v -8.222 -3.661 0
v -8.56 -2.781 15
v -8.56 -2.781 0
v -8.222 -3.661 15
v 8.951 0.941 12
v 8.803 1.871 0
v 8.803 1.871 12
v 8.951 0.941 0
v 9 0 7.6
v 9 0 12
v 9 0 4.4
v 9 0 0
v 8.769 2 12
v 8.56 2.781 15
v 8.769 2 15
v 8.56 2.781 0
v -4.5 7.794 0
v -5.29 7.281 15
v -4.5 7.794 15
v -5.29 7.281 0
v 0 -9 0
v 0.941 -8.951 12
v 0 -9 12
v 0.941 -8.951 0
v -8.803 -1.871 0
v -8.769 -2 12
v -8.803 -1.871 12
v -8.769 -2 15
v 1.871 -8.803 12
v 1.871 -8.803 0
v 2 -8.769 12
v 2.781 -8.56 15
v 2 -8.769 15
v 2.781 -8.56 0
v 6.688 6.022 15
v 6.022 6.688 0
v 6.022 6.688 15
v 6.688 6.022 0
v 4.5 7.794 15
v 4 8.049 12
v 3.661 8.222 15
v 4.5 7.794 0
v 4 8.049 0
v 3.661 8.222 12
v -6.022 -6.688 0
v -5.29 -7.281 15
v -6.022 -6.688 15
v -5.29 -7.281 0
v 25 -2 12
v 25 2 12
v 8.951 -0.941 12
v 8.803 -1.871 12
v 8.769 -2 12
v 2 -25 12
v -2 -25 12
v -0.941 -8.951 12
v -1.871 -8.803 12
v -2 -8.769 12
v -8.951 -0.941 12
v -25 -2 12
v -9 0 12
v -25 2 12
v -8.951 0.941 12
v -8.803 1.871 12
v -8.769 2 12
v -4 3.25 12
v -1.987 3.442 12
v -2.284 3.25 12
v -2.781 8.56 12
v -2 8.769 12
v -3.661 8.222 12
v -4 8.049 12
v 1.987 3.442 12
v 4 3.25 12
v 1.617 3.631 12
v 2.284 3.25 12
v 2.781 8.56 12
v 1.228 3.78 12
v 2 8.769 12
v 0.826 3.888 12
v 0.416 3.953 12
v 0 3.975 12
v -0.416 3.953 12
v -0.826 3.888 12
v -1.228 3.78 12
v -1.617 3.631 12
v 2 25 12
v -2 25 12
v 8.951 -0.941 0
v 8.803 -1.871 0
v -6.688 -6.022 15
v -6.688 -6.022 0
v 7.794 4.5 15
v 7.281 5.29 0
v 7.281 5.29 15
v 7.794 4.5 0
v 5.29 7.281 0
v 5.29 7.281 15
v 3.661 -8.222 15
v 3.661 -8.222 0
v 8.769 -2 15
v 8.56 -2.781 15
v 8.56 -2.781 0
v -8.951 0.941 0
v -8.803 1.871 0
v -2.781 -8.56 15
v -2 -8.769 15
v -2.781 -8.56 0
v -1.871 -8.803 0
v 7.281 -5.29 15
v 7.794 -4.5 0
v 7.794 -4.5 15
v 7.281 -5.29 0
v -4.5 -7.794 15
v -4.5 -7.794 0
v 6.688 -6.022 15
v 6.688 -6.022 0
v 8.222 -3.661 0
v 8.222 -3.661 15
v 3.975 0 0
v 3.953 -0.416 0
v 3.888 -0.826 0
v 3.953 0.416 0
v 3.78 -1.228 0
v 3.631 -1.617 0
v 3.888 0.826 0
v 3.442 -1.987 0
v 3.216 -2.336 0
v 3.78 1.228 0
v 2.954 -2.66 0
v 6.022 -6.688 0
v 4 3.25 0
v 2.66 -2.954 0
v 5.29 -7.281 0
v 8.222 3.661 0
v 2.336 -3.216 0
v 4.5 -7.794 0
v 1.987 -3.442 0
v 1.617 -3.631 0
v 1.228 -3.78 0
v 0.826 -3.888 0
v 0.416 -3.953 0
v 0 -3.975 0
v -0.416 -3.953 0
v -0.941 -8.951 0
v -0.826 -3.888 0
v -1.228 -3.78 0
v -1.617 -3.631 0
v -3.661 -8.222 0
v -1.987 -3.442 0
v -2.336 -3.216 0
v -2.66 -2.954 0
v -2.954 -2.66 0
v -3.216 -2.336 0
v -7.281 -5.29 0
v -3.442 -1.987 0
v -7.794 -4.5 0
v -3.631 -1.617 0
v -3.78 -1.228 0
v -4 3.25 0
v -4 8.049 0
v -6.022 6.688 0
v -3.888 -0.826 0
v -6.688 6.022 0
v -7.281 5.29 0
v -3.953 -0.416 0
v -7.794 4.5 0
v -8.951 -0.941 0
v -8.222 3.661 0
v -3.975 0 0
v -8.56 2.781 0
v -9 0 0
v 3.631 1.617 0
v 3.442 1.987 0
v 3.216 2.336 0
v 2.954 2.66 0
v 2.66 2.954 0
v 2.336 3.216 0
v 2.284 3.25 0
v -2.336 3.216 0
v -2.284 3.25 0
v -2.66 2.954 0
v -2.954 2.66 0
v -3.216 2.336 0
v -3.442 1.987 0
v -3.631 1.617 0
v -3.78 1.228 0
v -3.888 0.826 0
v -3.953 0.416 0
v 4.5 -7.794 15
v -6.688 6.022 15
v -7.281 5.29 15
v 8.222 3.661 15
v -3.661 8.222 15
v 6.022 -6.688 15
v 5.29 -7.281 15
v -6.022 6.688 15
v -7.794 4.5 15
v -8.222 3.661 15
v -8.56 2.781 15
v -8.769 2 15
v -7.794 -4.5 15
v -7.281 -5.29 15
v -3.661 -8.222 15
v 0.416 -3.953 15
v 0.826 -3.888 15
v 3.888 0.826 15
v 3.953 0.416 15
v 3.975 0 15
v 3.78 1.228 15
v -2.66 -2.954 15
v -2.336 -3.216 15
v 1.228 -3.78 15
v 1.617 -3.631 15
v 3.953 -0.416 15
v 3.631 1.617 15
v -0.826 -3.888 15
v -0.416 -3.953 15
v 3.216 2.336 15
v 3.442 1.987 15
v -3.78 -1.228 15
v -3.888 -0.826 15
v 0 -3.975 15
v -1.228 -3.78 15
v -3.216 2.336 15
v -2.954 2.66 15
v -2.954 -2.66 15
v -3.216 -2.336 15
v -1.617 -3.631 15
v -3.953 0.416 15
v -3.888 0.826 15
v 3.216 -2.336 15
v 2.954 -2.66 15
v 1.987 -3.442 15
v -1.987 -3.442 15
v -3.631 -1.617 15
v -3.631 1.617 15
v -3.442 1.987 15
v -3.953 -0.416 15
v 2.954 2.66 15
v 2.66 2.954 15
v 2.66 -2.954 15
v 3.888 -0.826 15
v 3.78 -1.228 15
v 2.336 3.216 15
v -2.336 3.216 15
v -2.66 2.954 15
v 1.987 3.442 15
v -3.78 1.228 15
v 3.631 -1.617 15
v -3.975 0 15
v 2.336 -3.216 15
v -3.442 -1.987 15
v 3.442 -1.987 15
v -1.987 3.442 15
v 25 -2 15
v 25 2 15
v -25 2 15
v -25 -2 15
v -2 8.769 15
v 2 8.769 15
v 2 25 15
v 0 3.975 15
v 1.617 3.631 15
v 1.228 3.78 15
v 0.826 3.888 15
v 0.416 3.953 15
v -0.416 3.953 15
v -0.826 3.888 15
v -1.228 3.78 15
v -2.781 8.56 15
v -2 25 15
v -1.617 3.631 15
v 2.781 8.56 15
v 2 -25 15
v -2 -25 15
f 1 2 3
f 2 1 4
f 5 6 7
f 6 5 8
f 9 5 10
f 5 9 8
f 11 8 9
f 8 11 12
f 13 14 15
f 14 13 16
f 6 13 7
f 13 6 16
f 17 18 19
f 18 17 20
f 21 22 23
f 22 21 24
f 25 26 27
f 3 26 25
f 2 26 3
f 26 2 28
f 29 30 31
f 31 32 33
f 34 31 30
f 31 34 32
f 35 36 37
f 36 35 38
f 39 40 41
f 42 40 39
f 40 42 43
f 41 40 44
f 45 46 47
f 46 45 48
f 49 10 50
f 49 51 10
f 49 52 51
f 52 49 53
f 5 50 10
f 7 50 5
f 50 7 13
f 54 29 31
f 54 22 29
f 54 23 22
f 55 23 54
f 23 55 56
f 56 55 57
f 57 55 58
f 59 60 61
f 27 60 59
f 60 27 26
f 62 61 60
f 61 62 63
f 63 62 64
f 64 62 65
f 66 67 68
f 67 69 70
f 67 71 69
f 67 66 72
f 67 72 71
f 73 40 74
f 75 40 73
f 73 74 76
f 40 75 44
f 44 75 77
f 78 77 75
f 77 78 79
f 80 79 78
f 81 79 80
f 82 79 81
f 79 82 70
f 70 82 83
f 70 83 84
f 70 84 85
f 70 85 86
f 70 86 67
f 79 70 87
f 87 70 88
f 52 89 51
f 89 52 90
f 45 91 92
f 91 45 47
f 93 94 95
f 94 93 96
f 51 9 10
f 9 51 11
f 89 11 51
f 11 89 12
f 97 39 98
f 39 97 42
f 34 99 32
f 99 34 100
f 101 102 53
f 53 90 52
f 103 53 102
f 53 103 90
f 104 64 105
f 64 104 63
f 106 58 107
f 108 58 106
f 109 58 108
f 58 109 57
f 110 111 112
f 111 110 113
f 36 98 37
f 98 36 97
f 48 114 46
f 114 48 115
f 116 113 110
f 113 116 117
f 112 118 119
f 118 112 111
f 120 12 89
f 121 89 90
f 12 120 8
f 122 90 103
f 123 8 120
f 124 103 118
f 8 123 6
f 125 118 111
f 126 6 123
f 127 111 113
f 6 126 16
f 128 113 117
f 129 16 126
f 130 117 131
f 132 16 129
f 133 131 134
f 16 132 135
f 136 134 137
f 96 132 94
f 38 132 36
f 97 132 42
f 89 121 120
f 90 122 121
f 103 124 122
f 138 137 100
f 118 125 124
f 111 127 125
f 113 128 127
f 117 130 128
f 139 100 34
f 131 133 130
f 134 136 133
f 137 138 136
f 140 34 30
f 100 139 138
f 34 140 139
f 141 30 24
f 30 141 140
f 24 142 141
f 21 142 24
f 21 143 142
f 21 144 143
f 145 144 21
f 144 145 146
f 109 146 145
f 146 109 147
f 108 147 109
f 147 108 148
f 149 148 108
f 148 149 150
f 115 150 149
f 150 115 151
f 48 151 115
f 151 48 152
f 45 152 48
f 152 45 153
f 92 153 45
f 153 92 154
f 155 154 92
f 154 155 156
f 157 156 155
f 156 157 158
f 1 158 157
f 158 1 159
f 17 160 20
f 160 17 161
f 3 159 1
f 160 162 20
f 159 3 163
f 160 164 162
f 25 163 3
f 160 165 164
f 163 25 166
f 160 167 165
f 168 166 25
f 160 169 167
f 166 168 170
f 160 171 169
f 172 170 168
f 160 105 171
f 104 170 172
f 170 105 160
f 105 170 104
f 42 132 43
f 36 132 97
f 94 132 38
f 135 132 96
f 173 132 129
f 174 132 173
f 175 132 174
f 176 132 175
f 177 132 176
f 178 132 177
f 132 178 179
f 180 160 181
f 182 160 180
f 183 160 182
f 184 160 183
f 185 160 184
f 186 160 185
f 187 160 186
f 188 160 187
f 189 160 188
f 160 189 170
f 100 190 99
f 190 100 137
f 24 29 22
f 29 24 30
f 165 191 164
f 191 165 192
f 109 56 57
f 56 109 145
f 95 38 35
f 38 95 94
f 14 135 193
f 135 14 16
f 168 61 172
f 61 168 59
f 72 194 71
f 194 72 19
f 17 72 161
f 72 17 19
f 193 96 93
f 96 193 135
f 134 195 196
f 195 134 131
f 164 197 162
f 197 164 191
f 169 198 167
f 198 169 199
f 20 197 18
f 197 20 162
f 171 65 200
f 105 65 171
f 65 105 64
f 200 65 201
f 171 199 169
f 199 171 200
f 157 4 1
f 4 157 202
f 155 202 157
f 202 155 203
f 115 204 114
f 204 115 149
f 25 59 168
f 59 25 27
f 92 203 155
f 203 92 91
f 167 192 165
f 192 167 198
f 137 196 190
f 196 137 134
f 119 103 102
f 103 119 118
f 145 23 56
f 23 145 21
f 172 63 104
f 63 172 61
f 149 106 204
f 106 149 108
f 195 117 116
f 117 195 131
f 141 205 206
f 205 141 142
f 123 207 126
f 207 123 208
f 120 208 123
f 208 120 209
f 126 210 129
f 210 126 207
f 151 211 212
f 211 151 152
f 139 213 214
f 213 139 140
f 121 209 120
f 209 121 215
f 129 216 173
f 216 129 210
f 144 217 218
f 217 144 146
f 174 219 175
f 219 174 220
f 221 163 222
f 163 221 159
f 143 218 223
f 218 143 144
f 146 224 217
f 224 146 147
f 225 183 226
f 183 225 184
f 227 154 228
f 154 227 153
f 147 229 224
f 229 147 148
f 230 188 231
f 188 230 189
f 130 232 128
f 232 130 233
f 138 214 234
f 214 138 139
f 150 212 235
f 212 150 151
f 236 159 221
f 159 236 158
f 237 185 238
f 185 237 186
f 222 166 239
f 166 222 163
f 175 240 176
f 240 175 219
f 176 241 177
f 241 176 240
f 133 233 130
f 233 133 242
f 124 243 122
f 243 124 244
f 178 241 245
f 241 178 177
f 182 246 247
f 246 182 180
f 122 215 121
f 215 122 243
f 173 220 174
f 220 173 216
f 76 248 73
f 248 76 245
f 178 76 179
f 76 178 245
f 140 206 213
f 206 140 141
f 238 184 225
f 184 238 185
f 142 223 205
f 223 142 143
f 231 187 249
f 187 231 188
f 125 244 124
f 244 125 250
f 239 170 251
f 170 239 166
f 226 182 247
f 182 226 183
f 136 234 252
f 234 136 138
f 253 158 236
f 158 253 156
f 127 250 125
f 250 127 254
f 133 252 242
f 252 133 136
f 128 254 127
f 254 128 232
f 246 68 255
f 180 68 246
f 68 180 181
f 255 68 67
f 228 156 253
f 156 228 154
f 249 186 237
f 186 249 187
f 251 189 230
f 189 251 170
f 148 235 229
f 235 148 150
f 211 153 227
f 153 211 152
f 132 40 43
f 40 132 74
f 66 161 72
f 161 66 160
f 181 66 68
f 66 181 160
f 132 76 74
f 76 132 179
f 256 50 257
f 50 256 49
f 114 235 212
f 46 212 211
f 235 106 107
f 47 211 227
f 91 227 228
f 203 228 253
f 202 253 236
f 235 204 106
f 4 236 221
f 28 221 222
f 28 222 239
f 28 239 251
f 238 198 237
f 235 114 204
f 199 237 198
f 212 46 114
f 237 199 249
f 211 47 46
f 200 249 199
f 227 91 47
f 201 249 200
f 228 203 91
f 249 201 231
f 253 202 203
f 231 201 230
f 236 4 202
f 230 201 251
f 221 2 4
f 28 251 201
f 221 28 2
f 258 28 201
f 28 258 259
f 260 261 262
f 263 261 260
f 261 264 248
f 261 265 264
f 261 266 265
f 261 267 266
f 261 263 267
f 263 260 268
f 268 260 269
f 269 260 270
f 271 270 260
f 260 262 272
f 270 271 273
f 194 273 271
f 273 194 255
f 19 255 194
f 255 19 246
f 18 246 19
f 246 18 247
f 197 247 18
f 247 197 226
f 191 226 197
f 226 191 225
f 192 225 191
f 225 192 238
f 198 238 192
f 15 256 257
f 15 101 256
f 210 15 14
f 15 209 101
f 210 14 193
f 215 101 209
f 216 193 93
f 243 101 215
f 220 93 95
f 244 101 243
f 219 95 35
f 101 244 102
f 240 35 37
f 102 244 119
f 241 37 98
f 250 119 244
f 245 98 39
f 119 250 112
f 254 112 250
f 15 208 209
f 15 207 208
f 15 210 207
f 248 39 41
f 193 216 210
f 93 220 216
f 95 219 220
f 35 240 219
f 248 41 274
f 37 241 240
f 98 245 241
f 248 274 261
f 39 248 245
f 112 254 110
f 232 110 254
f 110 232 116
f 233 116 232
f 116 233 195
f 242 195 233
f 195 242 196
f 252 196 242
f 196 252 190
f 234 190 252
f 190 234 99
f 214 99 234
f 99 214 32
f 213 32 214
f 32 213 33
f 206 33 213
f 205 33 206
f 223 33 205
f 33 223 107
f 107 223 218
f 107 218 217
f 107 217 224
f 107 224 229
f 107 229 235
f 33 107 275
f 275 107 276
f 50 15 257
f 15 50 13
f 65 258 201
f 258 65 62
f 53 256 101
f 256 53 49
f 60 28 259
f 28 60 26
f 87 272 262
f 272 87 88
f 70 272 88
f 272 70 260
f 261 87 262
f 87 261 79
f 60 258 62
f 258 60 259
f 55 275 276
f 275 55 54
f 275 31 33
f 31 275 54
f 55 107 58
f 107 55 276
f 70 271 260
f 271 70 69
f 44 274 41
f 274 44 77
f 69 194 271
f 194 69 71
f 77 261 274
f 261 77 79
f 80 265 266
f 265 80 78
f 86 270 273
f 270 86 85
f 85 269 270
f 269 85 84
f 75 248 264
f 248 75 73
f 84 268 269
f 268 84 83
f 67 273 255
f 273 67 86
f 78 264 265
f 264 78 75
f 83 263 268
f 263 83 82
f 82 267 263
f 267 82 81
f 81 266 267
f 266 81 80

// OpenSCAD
// ============================================================
// Wheel Hub Adapter — 8 mm bore to 120 mm rubber wheel
// ============================================================
// Press-fits onto motor shaft (8 mm D-flat or round).
// Outer spokes bolt to the wheel centre disc.
//
// Adjust shaft_d and flat_w if using a D-shaft motor.
// ============================================================

shaft_d    =  8.0;  // mm — motor shaft diameter
shaft_tol  =  0.05; // mm — diametric interference (press-fit)
flat_w     =  6.5;  // mm — D-flat chord width (set to shaft_d for round shaft)
hub_od     = 18;    // mm — hub outer diameter
hub_h      = 12;    // mm — hub height
spoke_n    =  4;    // number of spokes
spoke_w    =  4;    // mm
spoke_h    =  3;    // mm
wheel_bolt_d = 3.4; // mm — M3 bolt to wheel
wheel_bolt_r = 22;  // mm — bolt circle radius
set_screw_d  = 3.2; // mm — grub screw (M3) on hub side
$fn = 60;

bore_r = (shaft_d - shaft_tol) / 2;

// ============================================================
module hub_body() {
    difference() {
        cylinder(r = hub_od/2, h = hub_h);
        // Shaft bore
        translate([0, 0, -0.1])
            cylinder(r = bore_r, h = hub_h + 0.2);
        // D-flat (if applicable)
        translate([-shaft_d/2, flat_w/2, -0.1])
            cube([shaft_d, shaft_d, hub_h + 0.2]);
        // Grub screw hole (radial, M3)
        translate([hub_od/2, 0, hub_h/2])
            rotate([0, 90, 0])
                cylinder(r = set_screw_d/2, h = hub_od);
    }
}

module spoke_disc() {
    // Flat disc with spokes and bolt holes for wheel attachment
    difference() {
        union() {
            cylinder(r = hub_od/2, h = spoke_h);
            for (i = [0 : spoke_n - 1]) {
                rotate([0, 0, i * 360/spoke_n])
                    translate([0, -spoke_w/2, 0])
                        cube([wheel_bolt_r + 3, spoke_w, spoke_h]);
            }
        }
        // Wheel bolt holes
        for (i = [0 : spoke_n - 1]) {
            rotate([0, 0, i * 360/spoke_n + 360/(2*spoke_n)])
                translate([wheel_bolt_r, 0, -0.1])
                    cylinder(r = wheel_bolt_d/2, h = spoke_h + 0.2);
        }
        // Central shaft bore through disc
        translate([0, 0, -0.1])
            cylinder(r = bore_r, h = spoke_h + 0.2);
    }
}

// ============================================================
union() {
    color("Silver")    hub_body();
    color("LightGray") translate([0, 0, hub_h]) spoke_disc();
}
